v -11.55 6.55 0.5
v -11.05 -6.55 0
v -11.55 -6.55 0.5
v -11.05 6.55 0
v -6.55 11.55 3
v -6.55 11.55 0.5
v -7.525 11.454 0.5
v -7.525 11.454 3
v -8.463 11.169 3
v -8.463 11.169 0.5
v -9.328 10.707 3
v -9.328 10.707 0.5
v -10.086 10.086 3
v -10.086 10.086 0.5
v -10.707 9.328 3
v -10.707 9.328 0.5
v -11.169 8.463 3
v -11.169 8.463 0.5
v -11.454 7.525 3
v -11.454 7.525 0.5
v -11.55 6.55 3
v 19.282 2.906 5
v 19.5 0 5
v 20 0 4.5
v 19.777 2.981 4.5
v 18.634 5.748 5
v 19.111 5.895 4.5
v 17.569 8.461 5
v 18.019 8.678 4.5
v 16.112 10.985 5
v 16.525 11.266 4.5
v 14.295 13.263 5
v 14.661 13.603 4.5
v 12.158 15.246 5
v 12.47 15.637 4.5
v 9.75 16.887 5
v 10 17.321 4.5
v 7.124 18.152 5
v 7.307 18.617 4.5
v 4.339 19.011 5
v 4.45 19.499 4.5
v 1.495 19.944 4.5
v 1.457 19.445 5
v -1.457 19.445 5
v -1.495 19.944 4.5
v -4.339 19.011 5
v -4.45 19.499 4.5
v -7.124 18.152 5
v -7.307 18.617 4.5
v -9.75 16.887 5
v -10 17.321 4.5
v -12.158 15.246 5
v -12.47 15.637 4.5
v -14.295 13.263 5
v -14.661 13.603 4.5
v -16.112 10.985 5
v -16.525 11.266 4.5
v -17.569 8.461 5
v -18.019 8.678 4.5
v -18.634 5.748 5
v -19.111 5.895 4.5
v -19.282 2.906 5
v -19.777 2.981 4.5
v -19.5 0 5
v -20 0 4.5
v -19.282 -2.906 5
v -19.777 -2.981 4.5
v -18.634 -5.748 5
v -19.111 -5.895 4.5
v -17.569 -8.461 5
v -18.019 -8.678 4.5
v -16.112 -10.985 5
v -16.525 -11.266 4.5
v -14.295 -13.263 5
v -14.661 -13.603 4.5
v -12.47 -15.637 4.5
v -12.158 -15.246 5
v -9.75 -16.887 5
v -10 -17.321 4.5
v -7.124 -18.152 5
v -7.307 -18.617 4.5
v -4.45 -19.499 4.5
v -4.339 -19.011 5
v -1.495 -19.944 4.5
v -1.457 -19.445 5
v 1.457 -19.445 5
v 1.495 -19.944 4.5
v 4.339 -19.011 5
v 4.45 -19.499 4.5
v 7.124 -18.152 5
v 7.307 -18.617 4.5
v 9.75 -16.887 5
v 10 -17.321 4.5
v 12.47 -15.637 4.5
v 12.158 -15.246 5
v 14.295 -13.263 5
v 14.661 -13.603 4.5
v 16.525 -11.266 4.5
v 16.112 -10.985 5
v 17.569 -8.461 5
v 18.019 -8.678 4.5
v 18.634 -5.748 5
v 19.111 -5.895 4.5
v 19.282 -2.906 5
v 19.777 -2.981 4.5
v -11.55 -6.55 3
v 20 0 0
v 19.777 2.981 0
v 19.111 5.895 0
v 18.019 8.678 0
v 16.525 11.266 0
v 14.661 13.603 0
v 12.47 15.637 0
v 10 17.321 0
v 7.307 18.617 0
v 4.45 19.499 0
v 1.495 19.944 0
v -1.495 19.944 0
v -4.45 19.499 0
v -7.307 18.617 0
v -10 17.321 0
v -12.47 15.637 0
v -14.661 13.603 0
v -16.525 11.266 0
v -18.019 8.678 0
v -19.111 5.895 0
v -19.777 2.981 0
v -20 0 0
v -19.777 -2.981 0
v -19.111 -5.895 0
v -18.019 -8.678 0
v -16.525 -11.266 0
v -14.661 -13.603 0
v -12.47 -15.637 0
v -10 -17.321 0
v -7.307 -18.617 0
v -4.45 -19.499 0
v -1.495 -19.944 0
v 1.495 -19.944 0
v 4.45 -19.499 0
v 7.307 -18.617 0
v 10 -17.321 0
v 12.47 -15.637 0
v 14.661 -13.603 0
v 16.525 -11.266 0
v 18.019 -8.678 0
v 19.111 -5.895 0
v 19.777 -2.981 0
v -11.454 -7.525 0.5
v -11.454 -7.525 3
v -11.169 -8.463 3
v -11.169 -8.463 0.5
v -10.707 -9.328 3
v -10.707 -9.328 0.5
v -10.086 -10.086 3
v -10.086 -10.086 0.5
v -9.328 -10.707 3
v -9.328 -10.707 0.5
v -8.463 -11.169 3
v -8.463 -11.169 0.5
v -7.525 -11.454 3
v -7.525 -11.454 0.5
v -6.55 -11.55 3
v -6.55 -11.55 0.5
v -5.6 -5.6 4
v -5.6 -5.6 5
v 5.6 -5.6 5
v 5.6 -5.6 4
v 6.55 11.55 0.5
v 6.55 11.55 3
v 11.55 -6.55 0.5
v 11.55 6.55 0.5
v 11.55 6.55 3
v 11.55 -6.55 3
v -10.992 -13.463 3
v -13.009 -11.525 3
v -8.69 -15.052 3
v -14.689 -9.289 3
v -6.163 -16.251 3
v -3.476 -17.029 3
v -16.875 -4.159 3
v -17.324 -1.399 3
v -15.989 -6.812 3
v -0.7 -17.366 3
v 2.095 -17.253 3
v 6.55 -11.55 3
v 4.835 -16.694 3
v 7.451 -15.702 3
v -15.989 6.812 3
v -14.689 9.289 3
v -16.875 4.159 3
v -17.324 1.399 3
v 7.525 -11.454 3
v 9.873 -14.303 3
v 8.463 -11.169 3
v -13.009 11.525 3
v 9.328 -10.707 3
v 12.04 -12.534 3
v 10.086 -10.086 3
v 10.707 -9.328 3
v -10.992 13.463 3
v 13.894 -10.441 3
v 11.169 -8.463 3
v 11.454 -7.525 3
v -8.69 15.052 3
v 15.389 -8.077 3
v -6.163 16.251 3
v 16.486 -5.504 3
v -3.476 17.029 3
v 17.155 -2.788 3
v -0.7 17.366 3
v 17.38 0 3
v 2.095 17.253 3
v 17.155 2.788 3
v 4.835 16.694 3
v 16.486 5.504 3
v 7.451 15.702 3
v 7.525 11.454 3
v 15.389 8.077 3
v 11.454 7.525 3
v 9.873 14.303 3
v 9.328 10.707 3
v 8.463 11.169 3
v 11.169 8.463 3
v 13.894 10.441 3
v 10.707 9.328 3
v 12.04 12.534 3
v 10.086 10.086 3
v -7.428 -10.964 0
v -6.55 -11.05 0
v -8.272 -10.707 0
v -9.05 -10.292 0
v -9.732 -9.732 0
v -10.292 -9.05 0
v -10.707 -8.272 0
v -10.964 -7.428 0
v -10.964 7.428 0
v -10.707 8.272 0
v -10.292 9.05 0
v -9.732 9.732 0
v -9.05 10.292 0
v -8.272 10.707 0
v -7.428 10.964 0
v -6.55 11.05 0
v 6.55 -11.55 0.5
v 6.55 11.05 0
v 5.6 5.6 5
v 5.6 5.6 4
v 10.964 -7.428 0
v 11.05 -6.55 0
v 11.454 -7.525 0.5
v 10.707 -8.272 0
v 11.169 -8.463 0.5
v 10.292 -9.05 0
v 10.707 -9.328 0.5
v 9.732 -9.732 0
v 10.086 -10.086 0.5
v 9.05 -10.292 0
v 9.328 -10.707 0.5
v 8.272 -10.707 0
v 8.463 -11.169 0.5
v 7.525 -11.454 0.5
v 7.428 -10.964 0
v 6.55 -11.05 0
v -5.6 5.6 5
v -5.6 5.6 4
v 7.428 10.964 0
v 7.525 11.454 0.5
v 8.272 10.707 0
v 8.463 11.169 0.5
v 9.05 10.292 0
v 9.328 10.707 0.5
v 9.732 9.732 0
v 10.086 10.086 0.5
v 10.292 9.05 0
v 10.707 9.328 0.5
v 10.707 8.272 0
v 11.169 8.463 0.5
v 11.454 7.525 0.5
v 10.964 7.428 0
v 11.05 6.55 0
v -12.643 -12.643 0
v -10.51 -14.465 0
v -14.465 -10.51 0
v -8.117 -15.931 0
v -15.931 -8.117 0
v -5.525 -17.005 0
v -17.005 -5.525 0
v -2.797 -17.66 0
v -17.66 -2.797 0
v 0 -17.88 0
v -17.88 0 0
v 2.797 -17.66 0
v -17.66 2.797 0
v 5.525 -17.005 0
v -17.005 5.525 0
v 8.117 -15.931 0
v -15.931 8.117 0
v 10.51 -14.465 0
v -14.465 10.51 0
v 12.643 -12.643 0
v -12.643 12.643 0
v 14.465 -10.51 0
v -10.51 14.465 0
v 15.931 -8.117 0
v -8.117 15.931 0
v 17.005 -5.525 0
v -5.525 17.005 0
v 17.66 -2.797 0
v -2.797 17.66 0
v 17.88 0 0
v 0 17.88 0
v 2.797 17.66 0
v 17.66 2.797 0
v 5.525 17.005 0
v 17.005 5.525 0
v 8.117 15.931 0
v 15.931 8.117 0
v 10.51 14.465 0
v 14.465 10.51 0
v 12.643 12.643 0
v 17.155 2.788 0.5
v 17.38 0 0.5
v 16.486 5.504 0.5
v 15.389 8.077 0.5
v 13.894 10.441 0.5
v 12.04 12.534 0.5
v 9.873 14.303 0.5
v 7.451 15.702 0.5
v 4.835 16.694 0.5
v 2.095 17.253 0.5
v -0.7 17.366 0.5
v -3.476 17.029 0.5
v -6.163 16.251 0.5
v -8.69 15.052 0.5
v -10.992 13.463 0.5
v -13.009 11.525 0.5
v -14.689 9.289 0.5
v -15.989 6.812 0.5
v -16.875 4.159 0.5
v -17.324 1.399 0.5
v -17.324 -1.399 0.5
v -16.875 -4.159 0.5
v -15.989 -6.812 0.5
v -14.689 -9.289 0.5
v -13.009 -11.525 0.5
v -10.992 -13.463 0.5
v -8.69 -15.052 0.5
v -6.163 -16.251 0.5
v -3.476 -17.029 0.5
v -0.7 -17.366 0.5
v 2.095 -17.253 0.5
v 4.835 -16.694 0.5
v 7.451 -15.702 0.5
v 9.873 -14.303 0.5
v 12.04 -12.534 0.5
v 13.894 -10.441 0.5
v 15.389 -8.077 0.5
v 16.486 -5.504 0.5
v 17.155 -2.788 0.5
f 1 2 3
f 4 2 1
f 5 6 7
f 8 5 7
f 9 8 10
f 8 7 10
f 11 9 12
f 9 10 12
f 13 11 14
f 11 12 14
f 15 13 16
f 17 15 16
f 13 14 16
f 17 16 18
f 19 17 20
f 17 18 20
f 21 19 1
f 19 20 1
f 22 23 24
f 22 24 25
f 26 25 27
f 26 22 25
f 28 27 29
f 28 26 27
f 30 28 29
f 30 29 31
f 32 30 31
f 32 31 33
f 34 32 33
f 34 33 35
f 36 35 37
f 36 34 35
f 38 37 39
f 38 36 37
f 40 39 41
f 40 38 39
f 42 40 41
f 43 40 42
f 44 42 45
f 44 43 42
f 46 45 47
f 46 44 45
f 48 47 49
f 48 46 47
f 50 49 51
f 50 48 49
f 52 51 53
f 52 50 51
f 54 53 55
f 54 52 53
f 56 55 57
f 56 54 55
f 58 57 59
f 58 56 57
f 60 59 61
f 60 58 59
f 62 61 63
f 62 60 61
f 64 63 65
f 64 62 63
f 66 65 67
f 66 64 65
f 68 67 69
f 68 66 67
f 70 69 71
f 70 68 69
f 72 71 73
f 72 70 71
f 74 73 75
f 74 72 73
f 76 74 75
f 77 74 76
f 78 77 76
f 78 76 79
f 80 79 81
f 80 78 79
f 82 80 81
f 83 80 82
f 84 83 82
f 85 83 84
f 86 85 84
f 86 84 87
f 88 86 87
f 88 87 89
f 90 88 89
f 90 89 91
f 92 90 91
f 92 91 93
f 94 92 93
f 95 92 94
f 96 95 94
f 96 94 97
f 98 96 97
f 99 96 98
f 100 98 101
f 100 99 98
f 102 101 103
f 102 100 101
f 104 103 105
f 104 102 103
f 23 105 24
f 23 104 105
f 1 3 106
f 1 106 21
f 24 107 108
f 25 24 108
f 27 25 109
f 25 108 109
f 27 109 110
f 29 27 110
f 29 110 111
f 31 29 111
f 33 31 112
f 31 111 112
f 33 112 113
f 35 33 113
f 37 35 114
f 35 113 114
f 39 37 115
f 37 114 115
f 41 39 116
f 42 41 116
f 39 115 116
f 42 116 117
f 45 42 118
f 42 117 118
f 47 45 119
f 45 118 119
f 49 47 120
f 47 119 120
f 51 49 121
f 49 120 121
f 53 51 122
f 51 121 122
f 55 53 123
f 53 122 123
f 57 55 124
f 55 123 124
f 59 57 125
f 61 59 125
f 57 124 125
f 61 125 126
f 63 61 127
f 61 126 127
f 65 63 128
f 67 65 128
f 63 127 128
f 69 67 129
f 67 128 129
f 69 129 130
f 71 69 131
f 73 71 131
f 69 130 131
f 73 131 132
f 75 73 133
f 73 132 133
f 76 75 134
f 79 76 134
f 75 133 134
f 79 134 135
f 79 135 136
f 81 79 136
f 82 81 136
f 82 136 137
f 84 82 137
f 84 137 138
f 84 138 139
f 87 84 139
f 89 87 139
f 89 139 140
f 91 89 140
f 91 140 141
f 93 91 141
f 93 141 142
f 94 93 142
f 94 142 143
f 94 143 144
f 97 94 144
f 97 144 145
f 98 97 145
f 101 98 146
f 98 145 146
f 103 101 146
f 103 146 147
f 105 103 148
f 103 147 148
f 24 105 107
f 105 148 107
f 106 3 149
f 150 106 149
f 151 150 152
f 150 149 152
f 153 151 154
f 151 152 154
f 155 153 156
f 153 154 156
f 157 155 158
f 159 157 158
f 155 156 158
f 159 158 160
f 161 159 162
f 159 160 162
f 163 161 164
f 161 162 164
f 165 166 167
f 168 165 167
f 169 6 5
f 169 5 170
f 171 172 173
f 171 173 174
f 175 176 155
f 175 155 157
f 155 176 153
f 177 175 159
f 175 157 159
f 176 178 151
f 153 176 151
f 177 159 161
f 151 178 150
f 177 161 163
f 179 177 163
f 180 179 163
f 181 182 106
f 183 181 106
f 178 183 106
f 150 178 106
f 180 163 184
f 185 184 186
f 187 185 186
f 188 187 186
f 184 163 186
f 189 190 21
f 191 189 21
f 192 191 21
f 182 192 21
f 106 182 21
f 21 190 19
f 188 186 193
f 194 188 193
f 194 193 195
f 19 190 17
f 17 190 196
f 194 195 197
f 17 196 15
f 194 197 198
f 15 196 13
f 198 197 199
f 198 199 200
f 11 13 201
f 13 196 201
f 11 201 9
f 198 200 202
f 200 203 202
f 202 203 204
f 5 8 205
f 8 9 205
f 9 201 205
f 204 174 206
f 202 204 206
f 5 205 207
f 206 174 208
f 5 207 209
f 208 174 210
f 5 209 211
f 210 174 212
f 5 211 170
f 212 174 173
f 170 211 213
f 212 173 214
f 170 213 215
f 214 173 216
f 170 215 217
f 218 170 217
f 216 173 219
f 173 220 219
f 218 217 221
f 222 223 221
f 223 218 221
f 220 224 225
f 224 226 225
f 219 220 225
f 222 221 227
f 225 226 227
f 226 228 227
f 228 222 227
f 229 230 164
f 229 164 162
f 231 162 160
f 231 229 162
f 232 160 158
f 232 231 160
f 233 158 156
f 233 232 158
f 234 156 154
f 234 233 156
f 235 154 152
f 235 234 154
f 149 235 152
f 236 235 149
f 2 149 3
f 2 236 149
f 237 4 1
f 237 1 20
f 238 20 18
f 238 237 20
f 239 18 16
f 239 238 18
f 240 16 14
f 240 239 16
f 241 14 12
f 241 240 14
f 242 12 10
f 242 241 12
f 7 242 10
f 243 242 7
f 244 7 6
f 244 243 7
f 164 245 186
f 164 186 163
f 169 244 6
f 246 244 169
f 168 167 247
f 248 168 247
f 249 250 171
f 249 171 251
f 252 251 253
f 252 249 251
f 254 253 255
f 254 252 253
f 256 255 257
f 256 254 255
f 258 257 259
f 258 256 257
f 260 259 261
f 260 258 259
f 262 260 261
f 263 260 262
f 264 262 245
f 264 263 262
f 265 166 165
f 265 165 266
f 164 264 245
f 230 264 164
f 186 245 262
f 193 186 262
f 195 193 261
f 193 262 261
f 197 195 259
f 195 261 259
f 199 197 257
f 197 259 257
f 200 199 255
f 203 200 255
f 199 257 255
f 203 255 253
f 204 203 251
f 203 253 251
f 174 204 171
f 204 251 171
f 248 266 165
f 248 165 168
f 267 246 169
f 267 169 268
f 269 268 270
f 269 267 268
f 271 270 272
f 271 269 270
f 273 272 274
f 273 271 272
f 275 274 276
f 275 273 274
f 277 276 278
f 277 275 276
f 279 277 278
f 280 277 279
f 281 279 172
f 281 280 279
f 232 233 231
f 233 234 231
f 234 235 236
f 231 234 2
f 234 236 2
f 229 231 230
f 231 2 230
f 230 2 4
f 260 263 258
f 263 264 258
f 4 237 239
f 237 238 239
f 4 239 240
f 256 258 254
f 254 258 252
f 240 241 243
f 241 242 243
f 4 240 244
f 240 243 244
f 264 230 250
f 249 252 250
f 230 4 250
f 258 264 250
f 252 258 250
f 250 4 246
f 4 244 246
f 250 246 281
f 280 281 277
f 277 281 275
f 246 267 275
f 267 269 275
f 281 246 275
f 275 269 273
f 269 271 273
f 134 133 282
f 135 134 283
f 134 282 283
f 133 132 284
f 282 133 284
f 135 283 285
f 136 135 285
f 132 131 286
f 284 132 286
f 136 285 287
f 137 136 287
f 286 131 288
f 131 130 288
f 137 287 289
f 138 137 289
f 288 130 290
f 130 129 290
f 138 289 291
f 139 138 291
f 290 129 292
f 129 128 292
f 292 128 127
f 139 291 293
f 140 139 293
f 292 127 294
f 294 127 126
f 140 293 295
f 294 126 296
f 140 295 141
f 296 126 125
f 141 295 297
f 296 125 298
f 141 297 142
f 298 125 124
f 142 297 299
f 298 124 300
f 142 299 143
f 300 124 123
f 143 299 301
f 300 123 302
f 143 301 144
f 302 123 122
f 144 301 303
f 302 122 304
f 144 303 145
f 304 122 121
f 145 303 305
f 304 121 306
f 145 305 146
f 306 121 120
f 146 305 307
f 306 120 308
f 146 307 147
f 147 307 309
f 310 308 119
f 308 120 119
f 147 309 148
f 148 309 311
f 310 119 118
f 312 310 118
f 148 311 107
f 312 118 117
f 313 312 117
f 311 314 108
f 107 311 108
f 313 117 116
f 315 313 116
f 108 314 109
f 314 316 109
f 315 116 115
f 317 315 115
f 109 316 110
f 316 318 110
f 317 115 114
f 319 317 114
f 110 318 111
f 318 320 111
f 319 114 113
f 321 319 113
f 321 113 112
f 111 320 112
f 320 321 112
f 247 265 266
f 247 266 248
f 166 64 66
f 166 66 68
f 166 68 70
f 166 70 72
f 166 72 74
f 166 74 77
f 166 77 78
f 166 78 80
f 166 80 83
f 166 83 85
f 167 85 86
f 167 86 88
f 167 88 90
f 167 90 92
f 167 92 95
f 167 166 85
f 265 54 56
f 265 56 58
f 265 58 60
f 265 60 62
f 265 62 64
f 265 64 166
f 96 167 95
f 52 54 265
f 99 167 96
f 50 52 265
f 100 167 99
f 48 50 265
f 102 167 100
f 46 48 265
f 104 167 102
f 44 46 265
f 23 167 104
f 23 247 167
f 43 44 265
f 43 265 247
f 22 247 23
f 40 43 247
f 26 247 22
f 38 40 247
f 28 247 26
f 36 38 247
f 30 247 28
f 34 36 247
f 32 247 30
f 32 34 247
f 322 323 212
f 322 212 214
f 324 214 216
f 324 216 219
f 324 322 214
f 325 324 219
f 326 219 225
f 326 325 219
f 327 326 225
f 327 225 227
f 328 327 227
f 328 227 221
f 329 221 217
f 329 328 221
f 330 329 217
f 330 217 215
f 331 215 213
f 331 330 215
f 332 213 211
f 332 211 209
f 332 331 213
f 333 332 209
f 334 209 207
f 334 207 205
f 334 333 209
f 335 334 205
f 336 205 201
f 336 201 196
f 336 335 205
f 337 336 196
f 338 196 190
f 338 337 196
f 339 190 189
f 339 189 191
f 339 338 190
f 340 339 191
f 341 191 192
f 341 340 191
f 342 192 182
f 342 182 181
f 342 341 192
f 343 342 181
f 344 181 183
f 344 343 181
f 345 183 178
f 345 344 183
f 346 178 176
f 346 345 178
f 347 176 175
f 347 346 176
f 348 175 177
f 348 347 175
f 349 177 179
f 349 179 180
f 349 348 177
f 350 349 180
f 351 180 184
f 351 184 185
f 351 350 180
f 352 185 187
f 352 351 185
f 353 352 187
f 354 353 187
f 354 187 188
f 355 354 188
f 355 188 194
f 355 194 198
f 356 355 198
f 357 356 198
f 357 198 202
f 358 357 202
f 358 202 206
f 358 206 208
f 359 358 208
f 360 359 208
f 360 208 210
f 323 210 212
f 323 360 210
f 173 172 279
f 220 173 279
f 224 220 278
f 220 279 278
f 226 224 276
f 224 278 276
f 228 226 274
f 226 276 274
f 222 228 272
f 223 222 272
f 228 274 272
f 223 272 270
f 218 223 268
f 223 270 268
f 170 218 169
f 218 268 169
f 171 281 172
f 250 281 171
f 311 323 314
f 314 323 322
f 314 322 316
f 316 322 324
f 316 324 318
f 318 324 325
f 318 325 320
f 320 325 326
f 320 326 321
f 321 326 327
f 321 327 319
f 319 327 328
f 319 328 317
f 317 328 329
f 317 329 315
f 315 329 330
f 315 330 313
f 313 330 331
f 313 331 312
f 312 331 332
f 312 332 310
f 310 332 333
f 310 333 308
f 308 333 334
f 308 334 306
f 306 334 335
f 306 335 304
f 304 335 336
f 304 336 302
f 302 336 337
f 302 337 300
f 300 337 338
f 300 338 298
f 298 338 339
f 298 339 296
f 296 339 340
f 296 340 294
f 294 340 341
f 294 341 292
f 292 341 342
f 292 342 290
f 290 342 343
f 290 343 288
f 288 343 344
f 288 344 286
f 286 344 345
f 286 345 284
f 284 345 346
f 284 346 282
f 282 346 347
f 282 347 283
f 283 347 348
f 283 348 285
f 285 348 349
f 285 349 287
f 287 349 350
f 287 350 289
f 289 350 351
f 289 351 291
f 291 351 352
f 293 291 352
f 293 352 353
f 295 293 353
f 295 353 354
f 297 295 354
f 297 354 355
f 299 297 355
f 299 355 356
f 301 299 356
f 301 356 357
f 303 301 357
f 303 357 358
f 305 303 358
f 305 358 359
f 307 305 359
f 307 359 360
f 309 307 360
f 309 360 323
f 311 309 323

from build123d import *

# Parameters (mm, degrees)
SKETCH001_R     = 20
PAD_DEPTH       = 5
SKETCH_R        = 17.38
POCKET_DEPTH    = 3
CHAMFER_SIZE    = 0.5
SKETCH002_W     = 11.2
SKETCH002_H     = 11.2
POCKET001_DEPTH = 1


with BuildPart() as part:
    # Sketch001 → Pad (new body)
    with BuildSketch(Plane.XY):
        Circle(SKETCH001_R)
    extrude(amount=PAD_DEPTH)

    # Sketch → Pocket (cut)
    with BuildSketch(Plane.XY):
        Circle(SKETCH_R)
        with BuildLine():
            ThreePointArc((-6.55, 11.55), (-10.085534, 10.085534), (-11.55, 6.55))
            Line((-11.55, -6.55), (-11.55, 6.55))
            ThreePointArc((-11.55, -6.55), (-10.085534, -10.085534), (-6.55, -11.55))
            Line((6.55, -11.55), (-6.55, -11.55))
            ThreePointArc((6.55, -11.55), (10.085534, -10.085534), (11.55, -6.55))
            Line((11.55, 6.55), (11.55, -6.55))
            ThreePointArc((11.55, 6.55), (10.085534, 10.085534), (6.55, 11.55))
            Line((-6.55, 11.55), (6.55, 11.55))
        make_face(mode=Mode.SUBTRACT)
    extrude(amount=POCKET_DEPTH, mode=Mode.SUBTRACT)

    # Chamfer
    chamfer_edges = [part.edges().sort_by_distance(p)[0] for p in [
        (0, 11.55, 0),
        (10.085534, 10.085534, 0),
        (11.55, 0, 0),
        (10.085534, -10.085534, 0),
        (0, -11.55, 0),
        (-10.085534, -10.085534, 0),
        (-11.55, 0, 0),
        (-10.085534, 10.085534, 0),
        (-17.38, 0, 0),
        (-20, 0, 5),
    ]]
    chamfer(chamfer_edges, length=CHAMFER_SIZE)

    # Sketch002 (on DatumPlane) → Pocket001 (cut)
    with BuildSketch(Plane.XY.offset(5)):
        Rectangle(SKETCH002_W, SKETCH002_H)
    extrude(amount=-POCKET001_DEPTH, mode=Mode.SUBTRACT)


solid = part.part
